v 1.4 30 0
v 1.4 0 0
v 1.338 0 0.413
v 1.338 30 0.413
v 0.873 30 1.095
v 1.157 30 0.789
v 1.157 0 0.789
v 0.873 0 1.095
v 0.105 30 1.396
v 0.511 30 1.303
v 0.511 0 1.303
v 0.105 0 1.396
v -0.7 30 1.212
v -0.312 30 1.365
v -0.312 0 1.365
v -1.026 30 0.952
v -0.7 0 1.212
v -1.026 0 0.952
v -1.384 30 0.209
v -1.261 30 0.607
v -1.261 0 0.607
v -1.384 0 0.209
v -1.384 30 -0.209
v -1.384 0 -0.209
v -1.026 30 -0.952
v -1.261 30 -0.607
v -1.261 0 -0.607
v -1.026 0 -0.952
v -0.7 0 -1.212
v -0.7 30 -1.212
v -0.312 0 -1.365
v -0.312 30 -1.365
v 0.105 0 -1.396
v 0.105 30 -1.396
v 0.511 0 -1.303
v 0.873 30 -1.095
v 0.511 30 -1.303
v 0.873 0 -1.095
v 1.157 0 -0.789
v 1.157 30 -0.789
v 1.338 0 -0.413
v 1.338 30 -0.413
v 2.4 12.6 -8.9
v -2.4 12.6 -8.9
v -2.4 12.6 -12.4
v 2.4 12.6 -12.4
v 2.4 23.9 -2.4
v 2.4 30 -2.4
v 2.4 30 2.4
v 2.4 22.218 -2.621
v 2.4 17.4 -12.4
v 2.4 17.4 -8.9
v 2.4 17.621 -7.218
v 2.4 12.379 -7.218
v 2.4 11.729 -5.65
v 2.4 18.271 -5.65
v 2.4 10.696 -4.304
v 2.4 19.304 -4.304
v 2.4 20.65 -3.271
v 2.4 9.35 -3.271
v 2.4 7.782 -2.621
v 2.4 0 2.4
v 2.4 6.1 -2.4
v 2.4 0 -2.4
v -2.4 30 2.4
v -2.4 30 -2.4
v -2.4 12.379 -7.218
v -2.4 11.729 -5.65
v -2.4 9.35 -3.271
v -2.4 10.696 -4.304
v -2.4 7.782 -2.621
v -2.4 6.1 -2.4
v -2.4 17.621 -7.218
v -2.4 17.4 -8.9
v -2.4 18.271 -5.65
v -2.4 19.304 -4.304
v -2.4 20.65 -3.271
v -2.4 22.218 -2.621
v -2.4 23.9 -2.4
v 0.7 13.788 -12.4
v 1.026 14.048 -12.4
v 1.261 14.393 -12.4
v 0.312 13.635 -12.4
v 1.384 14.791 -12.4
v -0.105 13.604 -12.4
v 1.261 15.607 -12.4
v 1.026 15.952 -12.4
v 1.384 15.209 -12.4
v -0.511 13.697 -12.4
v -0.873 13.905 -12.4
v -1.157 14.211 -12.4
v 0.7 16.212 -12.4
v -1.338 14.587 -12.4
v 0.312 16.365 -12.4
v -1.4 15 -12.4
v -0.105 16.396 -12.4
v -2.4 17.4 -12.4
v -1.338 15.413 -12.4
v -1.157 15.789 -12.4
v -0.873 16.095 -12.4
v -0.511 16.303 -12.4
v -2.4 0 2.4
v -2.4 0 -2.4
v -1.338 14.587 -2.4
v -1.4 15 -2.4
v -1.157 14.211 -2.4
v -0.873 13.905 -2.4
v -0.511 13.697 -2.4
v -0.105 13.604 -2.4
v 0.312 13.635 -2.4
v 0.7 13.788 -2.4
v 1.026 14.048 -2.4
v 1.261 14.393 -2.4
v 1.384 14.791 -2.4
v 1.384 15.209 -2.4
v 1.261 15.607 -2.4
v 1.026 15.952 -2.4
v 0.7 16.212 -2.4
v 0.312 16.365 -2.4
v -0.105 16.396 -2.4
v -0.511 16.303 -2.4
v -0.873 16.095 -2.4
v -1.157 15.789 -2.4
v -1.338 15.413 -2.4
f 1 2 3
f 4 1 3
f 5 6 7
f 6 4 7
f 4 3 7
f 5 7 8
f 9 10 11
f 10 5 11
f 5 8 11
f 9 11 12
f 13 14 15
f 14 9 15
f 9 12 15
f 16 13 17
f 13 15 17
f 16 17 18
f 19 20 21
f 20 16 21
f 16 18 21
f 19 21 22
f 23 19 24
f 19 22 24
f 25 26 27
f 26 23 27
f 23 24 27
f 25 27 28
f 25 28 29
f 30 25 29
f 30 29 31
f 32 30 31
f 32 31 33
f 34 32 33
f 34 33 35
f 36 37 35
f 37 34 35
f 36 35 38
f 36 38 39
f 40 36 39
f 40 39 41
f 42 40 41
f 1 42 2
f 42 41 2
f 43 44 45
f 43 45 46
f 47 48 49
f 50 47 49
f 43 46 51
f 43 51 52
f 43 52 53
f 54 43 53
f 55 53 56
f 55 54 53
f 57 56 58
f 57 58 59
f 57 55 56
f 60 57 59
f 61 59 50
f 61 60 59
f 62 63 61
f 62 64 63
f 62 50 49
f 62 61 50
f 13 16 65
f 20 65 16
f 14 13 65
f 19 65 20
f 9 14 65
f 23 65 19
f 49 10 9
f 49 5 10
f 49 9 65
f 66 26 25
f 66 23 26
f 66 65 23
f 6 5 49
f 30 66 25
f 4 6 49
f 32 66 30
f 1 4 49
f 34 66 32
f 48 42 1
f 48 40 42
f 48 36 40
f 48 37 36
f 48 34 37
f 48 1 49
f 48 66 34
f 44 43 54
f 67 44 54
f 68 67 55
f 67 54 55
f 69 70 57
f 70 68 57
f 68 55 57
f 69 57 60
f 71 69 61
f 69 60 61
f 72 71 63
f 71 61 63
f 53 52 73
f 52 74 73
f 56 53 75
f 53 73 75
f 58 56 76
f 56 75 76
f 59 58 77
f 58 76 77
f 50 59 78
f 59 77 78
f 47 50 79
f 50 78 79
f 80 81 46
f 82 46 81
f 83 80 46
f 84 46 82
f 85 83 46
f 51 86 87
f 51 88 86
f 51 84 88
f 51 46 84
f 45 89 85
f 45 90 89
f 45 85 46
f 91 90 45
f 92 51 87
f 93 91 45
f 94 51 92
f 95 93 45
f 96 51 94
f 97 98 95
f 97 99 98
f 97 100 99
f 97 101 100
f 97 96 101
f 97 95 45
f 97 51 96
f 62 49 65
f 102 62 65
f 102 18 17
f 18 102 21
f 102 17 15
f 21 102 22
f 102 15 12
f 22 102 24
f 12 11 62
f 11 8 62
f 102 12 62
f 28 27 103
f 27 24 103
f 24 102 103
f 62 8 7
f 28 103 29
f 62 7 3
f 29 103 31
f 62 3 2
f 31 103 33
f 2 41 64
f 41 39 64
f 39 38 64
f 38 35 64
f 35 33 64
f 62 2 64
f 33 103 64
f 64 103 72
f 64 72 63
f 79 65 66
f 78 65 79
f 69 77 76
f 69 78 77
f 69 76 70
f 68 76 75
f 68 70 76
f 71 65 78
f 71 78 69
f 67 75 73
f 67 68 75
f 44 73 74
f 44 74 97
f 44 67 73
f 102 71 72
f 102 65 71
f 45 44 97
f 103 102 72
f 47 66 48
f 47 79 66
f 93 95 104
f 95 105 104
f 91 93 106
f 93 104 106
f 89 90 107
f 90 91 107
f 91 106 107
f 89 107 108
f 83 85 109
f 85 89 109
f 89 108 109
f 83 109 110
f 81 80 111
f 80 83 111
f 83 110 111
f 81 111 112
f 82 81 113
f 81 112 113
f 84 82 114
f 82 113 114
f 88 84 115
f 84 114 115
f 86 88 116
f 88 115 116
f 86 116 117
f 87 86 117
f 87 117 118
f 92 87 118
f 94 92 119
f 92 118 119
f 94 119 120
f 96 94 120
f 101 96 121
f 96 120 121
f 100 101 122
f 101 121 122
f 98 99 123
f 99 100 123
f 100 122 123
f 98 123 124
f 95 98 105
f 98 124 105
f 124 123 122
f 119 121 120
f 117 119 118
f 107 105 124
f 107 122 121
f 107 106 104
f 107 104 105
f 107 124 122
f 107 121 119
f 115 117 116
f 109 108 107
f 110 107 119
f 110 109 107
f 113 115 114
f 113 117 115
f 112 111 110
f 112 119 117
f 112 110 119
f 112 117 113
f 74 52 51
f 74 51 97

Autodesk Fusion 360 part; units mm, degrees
sketch "スケッチ2" plane through (0, 0, 0) normal (0, 1, 0) x (1, 0, 0)
  circle A0 centre (0, 0) radius 1.4
  circle A1 centre (0, 0) radius 2.4
  line L0 (2.4, -2.4) -> (-2.4, -2.4)
  line L1 (-2.4, -2.4) -> (-2.4, 2.4)
  line L2 (-2.4, 2.4) -> (2.4, 2.4)
  line L3 (2.4, 2.4) -> (2.4, -2.4)
  dimension "d1" = 2.8
  dimension "d2" = 1
extrude "押し出し1" add sketch "スケッチ2" along normal blind 30
sketch "スケッチ3" plane through (0, 0, -2.4) normal (0, 0, -1) x (-1, 0, 0)
  circle A0 centre (0, 15) radius 1.4
  circle A1 centre (0, 15) radius 2.4
  line L0 (0, 30) -> (0, 0) construction
  line L1 (2.25, 30) -> (-2.25, 30) construction
  line L2 (-2.4, 0) -> (2.4, 0)
  line L3 (2.4, 0) -> (2.4, 30)
  line L4 (2.4, 30) -> (-2.4, 30)
  line L5 (-2.4, 30) -> (-2.4, 0)
  line L6 (2.4, 12.6) -> (-2.4, 12.6)
  line L7 (-2.4, 12.6) -> (-2.4, 17.4)
  line L8 (-2.4, 17.4) -> (2.4, 17.4)
  line L9 (2.4, 17.4) -> (2.4, 12.6)
  dimension "d6" = 2.8
  dimension "d7" = 1
extrude "押し出し2" add sketch "スケッチ3" along normal blind 10 contours A1 | A1 L3 L6 L9 | A1 L3 L8 L9 | A1 L5 L7 L8 | A1 L5 L6 L7
fillet "フィレット1" radius 6.5 1 edges at (0, 12.6, -2.4)
fillet "フィレット2" radius 6.5 1 edges at (0, 17.4, -2.4)
